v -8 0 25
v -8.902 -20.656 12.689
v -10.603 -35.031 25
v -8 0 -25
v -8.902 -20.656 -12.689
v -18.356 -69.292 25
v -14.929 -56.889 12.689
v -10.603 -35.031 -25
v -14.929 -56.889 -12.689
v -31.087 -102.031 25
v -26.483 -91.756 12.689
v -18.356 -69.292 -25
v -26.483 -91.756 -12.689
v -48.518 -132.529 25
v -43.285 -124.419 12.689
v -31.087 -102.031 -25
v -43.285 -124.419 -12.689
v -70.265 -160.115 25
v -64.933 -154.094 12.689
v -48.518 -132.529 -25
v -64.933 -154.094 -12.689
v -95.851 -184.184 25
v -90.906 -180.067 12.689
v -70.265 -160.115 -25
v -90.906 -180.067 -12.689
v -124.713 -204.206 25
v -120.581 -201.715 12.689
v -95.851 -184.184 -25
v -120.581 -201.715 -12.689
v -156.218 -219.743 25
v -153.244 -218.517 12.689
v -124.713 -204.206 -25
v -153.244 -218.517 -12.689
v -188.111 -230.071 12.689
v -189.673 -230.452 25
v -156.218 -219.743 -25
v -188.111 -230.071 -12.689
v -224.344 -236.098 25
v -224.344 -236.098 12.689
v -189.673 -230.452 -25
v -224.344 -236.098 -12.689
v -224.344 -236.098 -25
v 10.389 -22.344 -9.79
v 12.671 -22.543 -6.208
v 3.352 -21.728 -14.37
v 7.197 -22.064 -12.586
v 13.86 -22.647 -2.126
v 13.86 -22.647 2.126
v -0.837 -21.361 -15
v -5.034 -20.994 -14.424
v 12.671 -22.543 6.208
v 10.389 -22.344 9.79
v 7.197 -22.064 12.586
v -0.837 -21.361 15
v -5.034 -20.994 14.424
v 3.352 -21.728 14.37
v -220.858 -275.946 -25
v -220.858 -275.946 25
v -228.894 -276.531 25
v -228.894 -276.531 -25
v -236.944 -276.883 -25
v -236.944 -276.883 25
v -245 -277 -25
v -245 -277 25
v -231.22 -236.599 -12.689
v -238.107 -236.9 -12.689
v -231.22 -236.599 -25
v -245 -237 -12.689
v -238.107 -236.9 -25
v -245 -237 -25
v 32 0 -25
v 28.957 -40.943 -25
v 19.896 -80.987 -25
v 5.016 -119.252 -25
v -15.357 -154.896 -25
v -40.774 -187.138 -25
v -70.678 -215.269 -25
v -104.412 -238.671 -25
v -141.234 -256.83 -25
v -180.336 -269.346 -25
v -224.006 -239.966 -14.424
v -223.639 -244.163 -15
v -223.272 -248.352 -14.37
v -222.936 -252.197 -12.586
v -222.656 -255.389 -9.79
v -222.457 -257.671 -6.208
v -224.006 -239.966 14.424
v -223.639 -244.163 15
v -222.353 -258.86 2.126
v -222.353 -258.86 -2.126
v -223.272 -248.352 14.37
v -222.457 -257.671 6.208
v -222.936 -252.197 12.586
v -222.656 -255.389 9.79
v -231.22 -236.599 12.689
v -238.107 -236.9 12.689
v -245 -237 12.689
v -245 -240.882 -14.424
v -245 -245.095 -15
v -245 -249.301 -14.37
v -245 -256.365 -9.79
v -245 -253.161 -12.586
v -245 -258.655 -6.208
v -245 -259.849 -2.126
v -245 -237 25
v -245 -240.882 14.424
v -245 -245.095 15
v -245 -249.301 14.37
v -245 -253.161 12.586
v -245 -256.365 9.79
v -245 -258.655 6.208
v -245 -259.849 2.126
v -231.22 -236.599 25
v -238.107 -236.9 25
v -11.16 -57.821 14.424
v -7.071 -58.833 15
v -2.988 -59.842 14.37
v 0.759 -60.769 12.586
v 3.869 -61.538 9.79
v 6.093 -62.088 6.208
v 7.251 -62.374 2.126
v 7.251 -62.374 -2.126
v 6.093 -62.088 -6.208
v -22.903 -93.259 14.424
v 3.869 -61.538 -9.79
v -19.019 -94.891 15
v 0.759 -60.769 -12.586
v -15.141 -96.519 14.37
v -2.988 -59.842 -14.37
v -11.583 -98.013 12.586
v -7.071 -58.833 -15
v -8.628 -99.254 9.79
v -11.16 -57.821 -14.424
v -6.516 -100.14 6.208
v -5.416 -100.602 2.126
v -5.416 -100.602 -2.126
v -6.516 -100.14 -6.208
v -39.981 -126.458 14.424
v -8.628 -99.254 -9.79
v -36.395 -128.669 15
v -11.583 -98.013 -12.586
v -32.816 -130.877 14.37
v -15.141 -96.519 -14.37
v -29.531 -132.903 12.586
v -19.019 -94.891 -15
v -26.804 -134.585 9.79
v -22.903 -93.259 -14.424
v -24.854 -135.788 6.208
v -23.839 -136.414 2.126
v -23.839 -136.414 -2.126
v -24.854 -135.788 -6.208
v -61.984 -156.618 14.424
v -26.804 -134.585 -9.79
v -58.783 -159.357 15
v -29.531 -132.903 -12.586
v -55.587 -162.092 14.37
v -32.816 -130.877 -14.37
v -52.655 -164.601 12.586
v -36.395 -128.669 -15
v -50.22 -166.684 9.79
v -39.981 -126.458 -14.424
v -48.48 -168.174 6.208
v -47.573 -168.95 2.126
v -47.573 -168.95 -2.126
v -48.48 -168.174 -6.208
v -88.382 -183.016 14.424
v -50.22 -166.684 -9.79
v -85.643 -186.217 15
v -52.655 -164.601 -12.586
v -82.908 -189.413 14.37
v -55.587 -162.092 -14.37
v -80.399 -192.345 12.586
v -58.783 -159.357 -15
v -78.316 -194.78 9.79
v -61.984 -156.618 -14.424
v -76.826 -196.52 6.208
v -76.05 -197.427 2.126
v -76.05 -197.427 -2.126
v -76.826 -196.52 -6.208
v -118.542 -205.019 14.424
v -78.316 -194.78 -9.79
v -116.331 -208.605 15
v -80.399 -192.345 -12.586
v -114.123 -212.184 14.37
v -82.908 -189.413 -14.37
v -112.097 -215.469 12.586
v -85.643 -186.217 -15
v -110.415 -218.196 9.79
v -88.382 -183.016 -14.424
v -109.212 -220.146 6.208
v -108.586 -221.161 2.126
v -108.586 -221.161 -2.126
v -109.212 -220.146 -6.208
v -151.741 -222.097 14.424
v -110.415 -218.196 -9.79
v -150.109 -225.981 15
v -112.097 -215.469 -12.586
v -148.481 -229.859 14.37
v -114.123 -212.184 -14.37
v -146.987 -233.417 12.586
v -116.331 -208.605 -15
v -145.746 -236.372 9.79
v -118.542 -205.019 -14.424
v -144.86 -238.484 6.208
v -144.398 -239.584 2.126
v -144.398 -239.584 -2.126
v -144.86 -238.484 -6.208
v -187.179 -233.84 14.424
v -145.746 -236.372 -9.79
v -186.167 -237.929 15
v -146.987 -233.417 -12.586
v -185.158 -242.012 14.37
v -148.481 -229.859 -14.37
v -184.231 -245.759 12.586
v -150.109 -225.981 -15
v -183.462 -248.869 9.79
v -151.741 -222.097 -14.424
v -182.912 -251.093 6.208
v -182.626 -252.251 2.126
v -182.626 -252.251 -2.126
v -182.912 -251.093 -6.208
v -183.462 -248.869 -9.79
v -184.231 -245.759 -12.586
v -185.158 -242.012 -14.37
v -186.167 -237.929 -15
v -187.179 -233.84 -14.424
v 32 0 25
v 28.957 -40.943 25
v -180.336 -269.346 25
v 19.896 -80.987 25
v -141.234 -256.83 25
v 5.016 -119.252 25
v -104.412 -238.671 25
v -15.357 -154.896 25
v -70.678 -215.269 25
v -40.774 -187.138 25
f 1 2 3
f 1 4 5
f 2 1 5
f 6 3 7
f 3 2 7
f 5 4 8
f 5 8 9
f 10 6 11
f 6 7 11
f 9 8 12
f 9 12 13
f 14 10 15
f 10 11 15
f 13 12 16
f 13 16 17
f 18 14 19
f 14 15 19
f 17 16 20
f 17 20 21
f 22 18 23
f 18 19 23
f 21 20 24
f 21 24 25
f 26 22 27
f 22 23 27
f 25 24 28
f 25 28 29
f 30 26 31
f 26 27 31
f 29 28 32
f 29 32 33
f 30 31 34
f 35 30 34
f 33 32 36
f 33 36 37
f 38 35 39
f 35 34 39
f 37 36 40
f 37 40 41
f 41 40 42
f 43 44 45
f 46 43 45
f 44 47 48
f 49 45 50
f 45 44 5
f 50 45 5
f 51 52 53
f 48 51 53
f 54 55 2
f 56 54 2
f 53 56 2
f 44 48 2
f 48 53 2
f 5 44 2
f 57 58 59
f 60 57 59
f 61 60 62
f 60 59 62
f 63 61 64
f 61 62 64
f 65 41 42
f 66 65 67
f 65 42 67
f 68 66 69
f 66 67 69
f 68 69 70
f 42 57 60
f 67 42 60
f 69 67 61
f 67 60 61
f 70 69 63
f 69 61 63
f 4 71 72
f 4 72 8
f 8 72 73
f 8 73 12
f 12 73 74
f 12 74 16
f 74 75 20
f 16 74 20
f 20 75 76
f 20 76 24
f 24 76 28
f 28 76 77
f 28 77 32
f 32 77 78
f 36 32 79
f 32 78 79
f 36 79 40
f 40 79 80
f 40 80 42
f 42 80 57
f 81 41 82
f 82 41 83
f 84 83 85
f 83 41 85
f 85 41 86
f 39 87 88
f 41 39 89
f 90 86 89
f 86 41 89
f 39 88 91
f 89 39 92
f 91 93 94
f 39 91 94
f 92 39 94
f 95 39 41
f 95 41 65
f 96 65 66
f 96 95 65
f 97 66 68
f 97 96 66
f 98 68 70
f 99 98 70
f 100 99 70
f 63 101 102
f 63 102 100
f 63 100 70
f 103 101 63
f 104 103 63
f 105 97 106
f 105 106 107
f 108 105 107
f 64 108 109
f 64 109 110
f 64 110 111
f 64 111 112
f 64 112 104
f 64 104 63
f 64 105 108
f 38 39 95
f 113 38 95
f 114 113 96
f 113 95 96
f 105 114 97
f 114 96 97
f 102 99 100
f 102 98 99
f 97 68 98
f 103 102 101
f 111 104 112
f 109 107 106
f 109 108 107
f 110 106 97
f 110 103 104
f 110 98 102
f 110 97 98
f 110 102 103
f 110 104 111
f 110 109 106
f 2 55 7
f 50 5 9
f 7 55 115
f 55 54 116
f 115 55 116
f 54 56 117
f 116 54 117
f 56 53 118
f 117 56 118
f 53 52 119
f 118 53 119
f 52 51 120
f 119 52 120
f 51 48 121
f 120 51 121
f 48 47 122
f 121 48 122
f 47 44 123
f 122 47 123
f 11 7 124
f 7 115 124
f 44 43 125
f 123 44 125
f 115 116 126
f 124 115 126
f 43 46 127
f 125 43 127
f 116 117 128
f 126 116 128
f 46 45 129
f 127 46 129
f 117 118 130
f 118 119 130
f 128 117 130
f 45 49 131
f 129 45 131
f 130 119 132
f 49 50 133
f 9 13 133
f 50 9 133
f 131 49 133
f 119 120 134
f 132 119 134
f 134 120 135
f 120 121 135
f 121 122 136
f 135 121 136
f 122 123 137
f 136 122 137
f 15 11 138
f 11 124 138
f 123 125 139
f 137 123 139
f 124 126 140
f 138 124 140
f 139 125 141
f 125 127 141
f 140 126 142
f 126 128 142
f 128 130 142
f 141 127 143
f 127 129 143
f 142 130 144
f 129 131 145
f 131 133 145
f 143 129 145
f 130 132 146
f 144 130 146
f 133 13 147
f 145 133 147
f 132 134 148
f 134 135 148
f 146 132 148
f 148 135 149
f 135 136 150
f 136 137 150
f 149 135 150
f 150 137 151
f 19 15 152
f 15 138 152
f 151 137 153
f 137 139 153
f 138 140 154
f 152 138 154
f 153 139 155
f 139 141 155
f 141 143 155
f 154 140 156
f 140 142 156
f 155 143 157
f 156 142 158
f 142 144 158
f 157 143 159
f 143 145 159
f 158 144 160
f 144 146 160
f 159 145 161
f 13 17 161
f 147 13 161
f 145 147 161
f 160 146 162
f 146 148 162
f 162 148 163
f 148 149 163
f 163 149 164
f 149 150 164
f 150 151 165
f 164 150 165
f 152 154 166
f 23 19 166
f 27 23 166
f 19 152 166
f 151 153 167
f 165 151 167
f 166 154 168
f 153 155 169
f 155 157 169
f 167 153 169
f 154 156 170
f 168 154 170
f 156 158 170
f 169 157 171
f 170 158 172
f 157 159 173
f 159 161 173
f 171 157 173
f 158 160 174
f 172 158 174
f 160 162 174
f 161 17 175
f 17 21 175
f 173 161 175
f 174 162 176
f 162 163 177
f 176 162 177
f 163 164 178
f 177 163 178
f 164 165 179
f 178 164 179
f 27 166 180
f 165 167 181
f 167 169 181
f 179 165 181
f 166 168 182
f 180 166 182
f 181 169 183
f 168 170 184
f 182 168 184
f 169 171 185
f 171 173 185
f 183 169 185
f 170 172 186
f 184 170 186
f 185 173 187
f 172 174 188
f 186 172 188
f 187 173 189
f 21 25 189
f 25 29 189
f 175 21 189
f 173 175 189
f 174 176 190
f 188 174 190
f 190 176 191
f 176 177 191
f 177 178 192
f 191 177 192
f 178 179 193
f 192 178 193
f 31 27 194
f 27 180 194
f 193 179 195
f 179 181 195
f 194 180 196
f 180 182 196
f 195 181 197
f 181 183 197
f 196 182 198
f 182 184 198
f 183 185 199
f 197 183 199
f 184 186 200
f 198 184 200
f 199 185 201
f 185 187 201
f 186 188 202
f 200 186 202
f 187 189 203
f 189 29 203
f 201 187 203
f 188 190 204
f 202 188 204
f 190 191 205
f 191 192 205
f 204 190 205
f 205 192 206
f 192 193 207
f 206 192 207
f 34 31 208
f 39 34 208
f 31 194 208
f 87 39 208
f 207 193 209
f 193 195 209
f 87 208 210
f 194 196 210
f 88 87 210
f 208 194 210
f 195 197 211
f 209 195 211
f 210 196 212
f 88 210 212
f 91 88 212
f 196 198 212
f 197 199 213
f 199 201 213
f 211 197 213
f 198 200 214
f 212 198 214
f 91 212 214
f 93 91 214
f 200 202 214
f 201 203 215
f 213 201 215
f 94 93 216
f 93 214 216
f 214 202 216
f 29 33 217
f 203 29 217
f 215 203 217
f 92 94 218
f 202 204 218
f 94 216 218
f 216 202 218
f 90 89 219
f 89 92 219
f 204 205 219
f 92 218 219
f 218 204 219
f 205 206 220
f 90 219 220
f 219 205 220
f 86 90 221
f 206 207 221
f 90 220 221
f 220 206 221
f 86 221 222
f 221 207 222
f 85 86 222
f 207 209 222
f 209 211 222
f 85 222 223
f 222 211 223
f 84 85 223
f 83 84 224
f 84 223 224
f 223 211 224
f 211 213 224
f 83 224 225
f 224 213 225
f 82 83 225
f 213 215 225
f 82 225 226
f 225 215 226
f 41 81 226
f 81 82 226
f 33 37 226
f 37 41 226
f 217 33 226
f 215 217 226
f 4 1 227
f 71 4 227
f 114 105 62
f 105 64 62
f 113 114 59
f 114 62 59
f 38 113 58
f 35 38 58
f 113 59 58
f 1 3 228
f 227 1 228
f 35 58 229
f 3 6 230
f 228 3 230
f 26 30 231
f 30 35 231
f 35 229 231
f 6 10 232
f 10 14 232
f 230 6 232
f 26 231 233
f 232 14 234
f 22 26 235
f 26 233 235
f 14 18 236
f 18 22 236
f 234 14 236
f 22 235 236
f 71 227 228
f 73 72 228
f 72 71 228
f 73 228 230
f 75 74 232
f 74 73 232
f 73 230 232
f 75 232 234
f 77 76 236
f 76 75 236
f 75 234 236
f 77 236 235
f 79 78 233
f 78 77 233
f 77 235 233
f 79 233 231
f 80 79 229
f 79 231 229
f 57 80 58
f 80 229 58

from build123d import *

# Parameters (mm, degrees)
F1_ANGLE       = 90
F2_W           = 40
F2_H           = 50
F3_ANGLE_BACK  = 5
F3_ANGLE       = 5
F4_W           = 40
F4_H           = 50
F5_ANGLE_START = 355
F5_ANGLE       = 5


with BuildPart() as f1:
    # F0 (on Front) → F1 (revolve)
    with BuildSketch(Plane.XZ):
        with BuildLine():
            Line((32, 25), (-8, 25))
            Line((-8, 25), (-8, 12.6885775404))
            ThreePointArc((-8, 12.6885775404), (15, 0), (-8, -12.6885775404))
            Line((-8, -12.6885775404), (-8, -25))
            Line((-8, -25), (32, -25))
            Line((32, -25), (32, 25))
        make_face()
    revolve(axis=Axis((-245, 0, -6.2683299184), (0, 0, -1)), revolution_arc=F1_ANGLE)

    # F2 (on face) → F3 (revolve)
    with BuildSketch(Plane(origin=(0, 0, 0), x_dir=(-1, 0, 0), z_dir=(0, 1, 0)), mode=Mode.PRIVATE) as f3_sk:
        with Locations((-12, 0)):
            Rectangle(F2_W, F2_H)
    revolve(f3_sk.sketch.rotate(Axis((-245, 0, 3.9664339274), (0, 0, 1)), -F3_ANGLE_BACK), axis=Axis((-245, 0, 3.9664339274), (0, 0, 1)), revolution_arc=F3_ANGLE)

    # F4 (on face) → F5 (revolve)
    with BuildSketch(Plane(origin=(-245, 0, 0), x_dir=(0, -1, 0), z_dir=(-1, 0, 0)), mode=Mode.PRIVATE) as f5_sk:
        with Locations((257, 0)):
            Rectangle(F4_W, F4_H)
    revolve(f5_sk.sketch.rotate(Axis((-245, 0, -1.3688886538), (0, 0, -1)), F5_ANGLE_START), axis=Axis((-245, 0, -1.3688886538), (0, 0, -1)), revolution_arc=F5_ANGLE)


solid = f1.part
